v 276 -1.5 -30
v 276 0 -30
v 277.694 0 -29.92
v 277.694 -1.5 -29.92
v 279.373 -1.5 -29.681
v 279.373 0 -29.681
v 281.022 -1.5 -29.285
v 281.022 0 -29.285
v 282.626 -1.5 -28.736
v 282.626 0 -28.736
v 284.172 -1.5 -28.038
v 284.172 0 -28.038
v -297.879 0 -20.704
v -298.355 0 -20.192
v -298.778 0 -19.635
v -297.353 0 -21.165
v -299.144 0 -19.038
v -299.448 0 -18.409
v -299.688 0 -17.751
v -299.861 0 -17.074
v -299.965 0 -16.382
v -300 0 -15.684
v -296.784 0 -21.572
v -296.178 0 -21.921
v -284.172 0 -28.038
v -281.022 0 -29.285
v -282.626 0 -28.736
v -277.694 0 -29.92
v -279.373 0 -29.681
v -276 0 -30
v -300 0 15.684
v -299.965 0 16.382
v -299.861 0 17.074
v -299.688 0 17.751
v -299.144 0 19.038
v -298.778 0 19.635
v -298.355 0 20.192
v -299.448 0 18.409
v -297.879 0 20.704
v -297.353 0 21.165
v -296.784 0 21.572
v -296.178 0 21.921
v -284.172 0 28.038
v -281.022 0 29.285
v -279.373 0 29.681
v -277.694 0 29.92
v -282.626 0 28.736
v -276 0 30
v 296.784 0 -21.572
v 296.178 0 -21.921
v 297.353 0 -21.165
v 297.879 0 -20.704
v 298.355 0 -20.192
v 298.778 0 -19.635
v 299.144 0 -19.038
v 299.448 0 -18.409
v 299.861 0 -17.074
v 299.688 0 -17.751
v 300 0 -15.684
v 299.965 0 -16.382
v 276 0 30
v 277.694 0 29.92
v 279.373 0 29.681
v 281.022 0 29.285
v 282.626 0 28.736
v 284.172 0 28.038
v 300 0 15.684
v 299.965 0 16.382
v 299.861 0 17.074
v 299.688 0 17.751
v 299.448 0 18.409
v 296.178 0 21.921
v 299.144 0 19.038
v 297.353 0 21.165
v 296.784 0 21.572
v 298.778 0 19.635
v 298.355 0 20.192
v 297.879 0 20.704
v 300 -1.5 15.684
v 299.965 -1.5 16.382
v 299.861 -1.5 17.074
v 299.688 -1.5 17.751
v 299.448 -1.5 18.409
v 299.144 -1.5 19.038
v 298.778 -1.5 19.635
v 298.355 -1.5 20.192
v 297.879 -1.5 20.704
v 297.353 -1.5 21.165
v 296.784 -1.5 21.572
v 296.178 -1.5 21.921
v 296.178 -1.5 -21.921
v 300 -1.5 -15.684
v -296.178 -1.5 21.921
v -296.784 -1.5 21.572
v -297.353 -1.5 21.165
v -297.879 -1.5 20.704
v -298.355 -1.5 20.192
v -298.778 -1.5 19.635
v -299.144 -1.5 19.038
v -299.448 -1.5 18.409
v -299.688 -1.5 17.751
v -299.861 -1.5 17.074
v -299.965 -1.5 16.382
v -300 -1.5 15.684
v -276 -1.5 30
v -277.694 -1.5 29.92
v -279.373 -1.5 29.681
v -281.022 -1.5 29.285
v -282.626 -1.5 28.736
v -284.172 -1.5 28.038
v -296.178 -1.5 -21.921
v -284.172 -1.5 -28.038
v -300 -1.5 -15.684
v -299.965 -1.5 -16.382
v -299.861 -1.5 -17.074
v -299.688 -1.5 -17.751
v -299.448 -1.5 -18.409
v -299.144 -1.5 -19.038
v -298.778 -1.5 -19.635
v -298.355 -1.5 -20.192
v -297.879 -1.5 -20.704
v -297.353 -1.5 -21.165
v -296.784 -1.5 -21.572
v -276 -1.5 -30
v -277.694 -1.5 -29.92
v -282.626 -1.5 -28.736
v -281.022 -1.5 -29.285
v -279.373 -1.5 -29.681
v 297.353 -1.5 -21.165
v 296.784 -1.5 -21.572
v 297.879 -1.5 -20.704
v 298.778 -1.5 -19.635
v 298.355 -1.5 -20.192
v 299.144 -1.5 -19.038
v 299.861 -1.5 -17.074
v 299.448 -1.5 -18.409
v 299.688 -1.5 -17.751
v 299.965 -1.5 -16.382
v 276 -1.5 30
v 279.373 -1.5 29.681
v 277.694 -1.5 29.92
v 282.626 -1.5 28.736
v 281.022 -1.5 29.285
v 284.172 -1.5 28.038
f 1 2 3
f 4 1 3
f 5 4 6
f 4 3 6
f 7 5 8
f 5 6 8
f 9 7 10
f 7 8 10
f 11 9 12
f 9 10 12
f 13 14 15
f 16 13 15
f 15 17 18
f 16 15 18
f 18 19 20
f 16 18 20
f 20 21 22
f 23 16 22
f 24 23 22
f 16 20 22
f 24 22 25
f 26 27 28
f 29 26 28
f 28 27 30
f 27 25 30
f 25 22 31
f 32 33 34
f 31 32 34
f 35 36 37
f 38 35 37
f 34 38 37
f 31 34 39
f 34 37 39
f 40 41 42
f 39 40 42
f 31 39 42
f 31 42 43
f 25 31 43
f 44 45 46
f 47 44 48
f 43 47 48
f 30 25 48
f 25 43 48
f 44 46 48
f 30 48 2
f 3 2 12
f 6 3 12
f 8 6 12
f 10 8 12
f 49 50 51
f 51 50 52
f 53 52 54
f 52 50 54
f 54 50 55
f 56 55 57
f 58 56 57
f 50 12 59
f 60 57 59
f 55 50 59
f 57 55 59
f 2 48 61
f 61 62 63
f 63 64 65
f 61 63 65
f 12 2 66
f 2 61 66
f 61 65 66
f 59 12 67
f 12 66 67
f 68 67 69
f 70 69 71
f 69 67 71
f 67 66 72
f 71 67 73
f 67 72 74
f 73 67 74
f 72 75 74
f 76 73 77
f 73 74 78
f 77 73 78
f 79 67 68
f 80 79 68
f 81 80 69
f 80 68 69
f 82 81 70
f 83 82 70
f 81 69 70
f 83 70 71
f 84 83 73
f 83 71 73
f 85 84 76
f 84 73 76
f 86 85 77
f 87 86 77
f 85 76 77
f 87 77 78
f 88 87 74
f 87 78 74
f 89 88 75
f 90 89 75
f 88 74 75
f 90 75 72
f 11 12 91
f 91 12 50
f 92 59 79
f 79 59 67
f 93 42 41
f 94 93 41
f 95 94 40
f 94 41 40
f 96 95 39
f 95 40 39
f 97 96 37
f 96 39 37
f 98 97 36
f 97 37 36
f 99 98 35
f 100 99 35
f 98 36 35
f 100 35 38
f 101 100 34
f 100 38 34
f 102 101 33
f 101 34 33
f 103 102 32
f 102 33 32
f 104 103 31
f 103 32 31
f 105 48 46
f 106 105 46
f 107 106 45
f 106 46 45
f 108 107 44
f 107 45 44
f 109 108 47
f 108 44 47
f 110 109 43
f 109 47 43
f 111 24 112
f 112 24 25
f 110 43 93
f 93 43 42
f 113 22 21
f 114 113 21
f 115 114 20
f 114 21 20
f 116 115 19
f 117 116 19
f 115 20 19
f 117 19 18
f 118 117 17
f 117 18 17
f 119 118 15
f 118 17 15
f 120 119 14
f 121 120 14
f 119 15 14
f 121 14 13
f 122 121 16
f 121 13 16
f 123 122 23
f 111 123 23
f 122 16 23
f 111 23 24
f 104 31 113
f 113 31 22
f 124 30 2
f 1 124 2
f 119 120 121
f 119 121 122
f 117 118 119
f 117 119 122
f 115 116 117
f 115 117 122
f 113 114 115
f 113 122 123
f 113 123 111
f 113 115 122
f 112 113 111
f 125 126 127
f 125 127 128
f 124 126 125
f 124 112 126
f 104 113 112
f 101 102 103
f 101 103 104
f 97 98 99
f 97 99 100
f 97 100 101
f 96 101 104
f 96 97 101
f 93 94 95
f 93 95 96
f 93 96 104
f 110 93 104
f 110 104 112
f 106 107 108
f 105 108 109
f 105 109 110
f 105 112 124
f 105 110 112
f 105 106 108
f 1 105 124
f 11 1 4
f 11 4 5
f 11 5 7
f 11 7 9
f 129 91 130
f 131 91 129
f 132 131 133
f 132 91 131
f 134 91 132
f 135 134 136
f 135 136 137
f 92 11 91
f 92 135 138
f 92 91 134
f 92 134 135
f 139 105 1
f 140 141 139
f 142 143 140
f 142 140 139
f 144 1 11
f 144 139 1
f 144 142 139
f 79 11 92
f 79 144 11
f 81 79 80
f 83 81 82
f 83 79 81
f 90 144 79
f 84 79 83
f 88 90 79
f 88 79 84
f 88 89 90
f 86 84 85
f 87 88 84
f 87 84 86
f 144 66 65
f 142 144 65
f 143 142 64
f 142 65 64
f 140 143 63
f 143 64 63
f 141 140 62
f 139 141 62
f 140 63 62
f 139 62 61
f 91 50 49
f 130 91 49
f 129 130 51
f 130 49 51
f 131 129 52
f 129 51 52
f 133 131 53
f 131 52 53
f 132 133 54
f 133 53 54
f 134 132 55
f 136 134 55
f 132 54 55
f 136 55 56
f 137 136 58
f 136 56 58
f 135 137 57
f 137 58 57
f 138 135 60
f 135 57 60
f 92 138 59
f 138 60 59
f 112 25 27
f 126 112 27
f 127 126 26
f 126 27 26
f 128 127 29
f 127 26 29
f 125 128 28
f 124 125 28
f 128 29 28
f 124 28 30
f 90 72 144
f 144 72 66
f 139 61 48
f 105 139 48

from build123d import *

# Parameters (mm, degrees)
F1_DEPTH = 1.5


with BuildPart() as f1:
    # F0 (on Front) → F1 (new body)
    with BuildSketch(Plane.XZ):
        with BuildLine():
            ThreePointArc((-276, 30), (-280.202017, 29.502659), (-284.171829, 28.038117))
            Line((-284.171829, 28.038117), (-296.177933, 21.920702))
            ThreePointArc((-296.177933, 21.920702), (-298.968481, 19.341146), (-300, 15.683656))
            Line((-300, 15.683656), (-300, 0))
            Line((-300, 0), (-300, -15.683656))
            ThreePointArc((-300, -15.683656), (-298.968481, -19.341146), (-296.177933, -21.920702))
            Line((-296.177933, -21.920702), (-284.171829, -28.038117))
            ThreePointArc((-284.171829, -28.038117), (-280.202017, -29.502659), (-276, -30))
            Line((-276, -30), (0, -30))
            Line((0, -30), (276, -30))
            ThreePointArc((276, -30), (280.202017, -29.502659), (284.171829, -28.038117))
            Line((284.171829, -28.038117), (296.177933, -21.920702))
            ThreePointArc((296.177933, -21.920702), (298.968481, -19.341146), (300, -15.683656))
            Line((300, -15.683656), (300, 0))
            Line((300, 0), (300, 15.683656))
            ThreePointArc((300, 15.683656), (298.968481, 19.341146), (296.177933, 21.920702))
            Line((296.177933, 21.920702), (284.171829, 28.038117))
            ThreePointArc((284.171829, 28.038117), (280.202017, 29.502659), (276, 30))
            Line((276, 30), (0, 30))
            Line((0, 30), (-276, 30))
        make_face()
    extrude(amount=F1_DEPTH)


solid = f1.part
